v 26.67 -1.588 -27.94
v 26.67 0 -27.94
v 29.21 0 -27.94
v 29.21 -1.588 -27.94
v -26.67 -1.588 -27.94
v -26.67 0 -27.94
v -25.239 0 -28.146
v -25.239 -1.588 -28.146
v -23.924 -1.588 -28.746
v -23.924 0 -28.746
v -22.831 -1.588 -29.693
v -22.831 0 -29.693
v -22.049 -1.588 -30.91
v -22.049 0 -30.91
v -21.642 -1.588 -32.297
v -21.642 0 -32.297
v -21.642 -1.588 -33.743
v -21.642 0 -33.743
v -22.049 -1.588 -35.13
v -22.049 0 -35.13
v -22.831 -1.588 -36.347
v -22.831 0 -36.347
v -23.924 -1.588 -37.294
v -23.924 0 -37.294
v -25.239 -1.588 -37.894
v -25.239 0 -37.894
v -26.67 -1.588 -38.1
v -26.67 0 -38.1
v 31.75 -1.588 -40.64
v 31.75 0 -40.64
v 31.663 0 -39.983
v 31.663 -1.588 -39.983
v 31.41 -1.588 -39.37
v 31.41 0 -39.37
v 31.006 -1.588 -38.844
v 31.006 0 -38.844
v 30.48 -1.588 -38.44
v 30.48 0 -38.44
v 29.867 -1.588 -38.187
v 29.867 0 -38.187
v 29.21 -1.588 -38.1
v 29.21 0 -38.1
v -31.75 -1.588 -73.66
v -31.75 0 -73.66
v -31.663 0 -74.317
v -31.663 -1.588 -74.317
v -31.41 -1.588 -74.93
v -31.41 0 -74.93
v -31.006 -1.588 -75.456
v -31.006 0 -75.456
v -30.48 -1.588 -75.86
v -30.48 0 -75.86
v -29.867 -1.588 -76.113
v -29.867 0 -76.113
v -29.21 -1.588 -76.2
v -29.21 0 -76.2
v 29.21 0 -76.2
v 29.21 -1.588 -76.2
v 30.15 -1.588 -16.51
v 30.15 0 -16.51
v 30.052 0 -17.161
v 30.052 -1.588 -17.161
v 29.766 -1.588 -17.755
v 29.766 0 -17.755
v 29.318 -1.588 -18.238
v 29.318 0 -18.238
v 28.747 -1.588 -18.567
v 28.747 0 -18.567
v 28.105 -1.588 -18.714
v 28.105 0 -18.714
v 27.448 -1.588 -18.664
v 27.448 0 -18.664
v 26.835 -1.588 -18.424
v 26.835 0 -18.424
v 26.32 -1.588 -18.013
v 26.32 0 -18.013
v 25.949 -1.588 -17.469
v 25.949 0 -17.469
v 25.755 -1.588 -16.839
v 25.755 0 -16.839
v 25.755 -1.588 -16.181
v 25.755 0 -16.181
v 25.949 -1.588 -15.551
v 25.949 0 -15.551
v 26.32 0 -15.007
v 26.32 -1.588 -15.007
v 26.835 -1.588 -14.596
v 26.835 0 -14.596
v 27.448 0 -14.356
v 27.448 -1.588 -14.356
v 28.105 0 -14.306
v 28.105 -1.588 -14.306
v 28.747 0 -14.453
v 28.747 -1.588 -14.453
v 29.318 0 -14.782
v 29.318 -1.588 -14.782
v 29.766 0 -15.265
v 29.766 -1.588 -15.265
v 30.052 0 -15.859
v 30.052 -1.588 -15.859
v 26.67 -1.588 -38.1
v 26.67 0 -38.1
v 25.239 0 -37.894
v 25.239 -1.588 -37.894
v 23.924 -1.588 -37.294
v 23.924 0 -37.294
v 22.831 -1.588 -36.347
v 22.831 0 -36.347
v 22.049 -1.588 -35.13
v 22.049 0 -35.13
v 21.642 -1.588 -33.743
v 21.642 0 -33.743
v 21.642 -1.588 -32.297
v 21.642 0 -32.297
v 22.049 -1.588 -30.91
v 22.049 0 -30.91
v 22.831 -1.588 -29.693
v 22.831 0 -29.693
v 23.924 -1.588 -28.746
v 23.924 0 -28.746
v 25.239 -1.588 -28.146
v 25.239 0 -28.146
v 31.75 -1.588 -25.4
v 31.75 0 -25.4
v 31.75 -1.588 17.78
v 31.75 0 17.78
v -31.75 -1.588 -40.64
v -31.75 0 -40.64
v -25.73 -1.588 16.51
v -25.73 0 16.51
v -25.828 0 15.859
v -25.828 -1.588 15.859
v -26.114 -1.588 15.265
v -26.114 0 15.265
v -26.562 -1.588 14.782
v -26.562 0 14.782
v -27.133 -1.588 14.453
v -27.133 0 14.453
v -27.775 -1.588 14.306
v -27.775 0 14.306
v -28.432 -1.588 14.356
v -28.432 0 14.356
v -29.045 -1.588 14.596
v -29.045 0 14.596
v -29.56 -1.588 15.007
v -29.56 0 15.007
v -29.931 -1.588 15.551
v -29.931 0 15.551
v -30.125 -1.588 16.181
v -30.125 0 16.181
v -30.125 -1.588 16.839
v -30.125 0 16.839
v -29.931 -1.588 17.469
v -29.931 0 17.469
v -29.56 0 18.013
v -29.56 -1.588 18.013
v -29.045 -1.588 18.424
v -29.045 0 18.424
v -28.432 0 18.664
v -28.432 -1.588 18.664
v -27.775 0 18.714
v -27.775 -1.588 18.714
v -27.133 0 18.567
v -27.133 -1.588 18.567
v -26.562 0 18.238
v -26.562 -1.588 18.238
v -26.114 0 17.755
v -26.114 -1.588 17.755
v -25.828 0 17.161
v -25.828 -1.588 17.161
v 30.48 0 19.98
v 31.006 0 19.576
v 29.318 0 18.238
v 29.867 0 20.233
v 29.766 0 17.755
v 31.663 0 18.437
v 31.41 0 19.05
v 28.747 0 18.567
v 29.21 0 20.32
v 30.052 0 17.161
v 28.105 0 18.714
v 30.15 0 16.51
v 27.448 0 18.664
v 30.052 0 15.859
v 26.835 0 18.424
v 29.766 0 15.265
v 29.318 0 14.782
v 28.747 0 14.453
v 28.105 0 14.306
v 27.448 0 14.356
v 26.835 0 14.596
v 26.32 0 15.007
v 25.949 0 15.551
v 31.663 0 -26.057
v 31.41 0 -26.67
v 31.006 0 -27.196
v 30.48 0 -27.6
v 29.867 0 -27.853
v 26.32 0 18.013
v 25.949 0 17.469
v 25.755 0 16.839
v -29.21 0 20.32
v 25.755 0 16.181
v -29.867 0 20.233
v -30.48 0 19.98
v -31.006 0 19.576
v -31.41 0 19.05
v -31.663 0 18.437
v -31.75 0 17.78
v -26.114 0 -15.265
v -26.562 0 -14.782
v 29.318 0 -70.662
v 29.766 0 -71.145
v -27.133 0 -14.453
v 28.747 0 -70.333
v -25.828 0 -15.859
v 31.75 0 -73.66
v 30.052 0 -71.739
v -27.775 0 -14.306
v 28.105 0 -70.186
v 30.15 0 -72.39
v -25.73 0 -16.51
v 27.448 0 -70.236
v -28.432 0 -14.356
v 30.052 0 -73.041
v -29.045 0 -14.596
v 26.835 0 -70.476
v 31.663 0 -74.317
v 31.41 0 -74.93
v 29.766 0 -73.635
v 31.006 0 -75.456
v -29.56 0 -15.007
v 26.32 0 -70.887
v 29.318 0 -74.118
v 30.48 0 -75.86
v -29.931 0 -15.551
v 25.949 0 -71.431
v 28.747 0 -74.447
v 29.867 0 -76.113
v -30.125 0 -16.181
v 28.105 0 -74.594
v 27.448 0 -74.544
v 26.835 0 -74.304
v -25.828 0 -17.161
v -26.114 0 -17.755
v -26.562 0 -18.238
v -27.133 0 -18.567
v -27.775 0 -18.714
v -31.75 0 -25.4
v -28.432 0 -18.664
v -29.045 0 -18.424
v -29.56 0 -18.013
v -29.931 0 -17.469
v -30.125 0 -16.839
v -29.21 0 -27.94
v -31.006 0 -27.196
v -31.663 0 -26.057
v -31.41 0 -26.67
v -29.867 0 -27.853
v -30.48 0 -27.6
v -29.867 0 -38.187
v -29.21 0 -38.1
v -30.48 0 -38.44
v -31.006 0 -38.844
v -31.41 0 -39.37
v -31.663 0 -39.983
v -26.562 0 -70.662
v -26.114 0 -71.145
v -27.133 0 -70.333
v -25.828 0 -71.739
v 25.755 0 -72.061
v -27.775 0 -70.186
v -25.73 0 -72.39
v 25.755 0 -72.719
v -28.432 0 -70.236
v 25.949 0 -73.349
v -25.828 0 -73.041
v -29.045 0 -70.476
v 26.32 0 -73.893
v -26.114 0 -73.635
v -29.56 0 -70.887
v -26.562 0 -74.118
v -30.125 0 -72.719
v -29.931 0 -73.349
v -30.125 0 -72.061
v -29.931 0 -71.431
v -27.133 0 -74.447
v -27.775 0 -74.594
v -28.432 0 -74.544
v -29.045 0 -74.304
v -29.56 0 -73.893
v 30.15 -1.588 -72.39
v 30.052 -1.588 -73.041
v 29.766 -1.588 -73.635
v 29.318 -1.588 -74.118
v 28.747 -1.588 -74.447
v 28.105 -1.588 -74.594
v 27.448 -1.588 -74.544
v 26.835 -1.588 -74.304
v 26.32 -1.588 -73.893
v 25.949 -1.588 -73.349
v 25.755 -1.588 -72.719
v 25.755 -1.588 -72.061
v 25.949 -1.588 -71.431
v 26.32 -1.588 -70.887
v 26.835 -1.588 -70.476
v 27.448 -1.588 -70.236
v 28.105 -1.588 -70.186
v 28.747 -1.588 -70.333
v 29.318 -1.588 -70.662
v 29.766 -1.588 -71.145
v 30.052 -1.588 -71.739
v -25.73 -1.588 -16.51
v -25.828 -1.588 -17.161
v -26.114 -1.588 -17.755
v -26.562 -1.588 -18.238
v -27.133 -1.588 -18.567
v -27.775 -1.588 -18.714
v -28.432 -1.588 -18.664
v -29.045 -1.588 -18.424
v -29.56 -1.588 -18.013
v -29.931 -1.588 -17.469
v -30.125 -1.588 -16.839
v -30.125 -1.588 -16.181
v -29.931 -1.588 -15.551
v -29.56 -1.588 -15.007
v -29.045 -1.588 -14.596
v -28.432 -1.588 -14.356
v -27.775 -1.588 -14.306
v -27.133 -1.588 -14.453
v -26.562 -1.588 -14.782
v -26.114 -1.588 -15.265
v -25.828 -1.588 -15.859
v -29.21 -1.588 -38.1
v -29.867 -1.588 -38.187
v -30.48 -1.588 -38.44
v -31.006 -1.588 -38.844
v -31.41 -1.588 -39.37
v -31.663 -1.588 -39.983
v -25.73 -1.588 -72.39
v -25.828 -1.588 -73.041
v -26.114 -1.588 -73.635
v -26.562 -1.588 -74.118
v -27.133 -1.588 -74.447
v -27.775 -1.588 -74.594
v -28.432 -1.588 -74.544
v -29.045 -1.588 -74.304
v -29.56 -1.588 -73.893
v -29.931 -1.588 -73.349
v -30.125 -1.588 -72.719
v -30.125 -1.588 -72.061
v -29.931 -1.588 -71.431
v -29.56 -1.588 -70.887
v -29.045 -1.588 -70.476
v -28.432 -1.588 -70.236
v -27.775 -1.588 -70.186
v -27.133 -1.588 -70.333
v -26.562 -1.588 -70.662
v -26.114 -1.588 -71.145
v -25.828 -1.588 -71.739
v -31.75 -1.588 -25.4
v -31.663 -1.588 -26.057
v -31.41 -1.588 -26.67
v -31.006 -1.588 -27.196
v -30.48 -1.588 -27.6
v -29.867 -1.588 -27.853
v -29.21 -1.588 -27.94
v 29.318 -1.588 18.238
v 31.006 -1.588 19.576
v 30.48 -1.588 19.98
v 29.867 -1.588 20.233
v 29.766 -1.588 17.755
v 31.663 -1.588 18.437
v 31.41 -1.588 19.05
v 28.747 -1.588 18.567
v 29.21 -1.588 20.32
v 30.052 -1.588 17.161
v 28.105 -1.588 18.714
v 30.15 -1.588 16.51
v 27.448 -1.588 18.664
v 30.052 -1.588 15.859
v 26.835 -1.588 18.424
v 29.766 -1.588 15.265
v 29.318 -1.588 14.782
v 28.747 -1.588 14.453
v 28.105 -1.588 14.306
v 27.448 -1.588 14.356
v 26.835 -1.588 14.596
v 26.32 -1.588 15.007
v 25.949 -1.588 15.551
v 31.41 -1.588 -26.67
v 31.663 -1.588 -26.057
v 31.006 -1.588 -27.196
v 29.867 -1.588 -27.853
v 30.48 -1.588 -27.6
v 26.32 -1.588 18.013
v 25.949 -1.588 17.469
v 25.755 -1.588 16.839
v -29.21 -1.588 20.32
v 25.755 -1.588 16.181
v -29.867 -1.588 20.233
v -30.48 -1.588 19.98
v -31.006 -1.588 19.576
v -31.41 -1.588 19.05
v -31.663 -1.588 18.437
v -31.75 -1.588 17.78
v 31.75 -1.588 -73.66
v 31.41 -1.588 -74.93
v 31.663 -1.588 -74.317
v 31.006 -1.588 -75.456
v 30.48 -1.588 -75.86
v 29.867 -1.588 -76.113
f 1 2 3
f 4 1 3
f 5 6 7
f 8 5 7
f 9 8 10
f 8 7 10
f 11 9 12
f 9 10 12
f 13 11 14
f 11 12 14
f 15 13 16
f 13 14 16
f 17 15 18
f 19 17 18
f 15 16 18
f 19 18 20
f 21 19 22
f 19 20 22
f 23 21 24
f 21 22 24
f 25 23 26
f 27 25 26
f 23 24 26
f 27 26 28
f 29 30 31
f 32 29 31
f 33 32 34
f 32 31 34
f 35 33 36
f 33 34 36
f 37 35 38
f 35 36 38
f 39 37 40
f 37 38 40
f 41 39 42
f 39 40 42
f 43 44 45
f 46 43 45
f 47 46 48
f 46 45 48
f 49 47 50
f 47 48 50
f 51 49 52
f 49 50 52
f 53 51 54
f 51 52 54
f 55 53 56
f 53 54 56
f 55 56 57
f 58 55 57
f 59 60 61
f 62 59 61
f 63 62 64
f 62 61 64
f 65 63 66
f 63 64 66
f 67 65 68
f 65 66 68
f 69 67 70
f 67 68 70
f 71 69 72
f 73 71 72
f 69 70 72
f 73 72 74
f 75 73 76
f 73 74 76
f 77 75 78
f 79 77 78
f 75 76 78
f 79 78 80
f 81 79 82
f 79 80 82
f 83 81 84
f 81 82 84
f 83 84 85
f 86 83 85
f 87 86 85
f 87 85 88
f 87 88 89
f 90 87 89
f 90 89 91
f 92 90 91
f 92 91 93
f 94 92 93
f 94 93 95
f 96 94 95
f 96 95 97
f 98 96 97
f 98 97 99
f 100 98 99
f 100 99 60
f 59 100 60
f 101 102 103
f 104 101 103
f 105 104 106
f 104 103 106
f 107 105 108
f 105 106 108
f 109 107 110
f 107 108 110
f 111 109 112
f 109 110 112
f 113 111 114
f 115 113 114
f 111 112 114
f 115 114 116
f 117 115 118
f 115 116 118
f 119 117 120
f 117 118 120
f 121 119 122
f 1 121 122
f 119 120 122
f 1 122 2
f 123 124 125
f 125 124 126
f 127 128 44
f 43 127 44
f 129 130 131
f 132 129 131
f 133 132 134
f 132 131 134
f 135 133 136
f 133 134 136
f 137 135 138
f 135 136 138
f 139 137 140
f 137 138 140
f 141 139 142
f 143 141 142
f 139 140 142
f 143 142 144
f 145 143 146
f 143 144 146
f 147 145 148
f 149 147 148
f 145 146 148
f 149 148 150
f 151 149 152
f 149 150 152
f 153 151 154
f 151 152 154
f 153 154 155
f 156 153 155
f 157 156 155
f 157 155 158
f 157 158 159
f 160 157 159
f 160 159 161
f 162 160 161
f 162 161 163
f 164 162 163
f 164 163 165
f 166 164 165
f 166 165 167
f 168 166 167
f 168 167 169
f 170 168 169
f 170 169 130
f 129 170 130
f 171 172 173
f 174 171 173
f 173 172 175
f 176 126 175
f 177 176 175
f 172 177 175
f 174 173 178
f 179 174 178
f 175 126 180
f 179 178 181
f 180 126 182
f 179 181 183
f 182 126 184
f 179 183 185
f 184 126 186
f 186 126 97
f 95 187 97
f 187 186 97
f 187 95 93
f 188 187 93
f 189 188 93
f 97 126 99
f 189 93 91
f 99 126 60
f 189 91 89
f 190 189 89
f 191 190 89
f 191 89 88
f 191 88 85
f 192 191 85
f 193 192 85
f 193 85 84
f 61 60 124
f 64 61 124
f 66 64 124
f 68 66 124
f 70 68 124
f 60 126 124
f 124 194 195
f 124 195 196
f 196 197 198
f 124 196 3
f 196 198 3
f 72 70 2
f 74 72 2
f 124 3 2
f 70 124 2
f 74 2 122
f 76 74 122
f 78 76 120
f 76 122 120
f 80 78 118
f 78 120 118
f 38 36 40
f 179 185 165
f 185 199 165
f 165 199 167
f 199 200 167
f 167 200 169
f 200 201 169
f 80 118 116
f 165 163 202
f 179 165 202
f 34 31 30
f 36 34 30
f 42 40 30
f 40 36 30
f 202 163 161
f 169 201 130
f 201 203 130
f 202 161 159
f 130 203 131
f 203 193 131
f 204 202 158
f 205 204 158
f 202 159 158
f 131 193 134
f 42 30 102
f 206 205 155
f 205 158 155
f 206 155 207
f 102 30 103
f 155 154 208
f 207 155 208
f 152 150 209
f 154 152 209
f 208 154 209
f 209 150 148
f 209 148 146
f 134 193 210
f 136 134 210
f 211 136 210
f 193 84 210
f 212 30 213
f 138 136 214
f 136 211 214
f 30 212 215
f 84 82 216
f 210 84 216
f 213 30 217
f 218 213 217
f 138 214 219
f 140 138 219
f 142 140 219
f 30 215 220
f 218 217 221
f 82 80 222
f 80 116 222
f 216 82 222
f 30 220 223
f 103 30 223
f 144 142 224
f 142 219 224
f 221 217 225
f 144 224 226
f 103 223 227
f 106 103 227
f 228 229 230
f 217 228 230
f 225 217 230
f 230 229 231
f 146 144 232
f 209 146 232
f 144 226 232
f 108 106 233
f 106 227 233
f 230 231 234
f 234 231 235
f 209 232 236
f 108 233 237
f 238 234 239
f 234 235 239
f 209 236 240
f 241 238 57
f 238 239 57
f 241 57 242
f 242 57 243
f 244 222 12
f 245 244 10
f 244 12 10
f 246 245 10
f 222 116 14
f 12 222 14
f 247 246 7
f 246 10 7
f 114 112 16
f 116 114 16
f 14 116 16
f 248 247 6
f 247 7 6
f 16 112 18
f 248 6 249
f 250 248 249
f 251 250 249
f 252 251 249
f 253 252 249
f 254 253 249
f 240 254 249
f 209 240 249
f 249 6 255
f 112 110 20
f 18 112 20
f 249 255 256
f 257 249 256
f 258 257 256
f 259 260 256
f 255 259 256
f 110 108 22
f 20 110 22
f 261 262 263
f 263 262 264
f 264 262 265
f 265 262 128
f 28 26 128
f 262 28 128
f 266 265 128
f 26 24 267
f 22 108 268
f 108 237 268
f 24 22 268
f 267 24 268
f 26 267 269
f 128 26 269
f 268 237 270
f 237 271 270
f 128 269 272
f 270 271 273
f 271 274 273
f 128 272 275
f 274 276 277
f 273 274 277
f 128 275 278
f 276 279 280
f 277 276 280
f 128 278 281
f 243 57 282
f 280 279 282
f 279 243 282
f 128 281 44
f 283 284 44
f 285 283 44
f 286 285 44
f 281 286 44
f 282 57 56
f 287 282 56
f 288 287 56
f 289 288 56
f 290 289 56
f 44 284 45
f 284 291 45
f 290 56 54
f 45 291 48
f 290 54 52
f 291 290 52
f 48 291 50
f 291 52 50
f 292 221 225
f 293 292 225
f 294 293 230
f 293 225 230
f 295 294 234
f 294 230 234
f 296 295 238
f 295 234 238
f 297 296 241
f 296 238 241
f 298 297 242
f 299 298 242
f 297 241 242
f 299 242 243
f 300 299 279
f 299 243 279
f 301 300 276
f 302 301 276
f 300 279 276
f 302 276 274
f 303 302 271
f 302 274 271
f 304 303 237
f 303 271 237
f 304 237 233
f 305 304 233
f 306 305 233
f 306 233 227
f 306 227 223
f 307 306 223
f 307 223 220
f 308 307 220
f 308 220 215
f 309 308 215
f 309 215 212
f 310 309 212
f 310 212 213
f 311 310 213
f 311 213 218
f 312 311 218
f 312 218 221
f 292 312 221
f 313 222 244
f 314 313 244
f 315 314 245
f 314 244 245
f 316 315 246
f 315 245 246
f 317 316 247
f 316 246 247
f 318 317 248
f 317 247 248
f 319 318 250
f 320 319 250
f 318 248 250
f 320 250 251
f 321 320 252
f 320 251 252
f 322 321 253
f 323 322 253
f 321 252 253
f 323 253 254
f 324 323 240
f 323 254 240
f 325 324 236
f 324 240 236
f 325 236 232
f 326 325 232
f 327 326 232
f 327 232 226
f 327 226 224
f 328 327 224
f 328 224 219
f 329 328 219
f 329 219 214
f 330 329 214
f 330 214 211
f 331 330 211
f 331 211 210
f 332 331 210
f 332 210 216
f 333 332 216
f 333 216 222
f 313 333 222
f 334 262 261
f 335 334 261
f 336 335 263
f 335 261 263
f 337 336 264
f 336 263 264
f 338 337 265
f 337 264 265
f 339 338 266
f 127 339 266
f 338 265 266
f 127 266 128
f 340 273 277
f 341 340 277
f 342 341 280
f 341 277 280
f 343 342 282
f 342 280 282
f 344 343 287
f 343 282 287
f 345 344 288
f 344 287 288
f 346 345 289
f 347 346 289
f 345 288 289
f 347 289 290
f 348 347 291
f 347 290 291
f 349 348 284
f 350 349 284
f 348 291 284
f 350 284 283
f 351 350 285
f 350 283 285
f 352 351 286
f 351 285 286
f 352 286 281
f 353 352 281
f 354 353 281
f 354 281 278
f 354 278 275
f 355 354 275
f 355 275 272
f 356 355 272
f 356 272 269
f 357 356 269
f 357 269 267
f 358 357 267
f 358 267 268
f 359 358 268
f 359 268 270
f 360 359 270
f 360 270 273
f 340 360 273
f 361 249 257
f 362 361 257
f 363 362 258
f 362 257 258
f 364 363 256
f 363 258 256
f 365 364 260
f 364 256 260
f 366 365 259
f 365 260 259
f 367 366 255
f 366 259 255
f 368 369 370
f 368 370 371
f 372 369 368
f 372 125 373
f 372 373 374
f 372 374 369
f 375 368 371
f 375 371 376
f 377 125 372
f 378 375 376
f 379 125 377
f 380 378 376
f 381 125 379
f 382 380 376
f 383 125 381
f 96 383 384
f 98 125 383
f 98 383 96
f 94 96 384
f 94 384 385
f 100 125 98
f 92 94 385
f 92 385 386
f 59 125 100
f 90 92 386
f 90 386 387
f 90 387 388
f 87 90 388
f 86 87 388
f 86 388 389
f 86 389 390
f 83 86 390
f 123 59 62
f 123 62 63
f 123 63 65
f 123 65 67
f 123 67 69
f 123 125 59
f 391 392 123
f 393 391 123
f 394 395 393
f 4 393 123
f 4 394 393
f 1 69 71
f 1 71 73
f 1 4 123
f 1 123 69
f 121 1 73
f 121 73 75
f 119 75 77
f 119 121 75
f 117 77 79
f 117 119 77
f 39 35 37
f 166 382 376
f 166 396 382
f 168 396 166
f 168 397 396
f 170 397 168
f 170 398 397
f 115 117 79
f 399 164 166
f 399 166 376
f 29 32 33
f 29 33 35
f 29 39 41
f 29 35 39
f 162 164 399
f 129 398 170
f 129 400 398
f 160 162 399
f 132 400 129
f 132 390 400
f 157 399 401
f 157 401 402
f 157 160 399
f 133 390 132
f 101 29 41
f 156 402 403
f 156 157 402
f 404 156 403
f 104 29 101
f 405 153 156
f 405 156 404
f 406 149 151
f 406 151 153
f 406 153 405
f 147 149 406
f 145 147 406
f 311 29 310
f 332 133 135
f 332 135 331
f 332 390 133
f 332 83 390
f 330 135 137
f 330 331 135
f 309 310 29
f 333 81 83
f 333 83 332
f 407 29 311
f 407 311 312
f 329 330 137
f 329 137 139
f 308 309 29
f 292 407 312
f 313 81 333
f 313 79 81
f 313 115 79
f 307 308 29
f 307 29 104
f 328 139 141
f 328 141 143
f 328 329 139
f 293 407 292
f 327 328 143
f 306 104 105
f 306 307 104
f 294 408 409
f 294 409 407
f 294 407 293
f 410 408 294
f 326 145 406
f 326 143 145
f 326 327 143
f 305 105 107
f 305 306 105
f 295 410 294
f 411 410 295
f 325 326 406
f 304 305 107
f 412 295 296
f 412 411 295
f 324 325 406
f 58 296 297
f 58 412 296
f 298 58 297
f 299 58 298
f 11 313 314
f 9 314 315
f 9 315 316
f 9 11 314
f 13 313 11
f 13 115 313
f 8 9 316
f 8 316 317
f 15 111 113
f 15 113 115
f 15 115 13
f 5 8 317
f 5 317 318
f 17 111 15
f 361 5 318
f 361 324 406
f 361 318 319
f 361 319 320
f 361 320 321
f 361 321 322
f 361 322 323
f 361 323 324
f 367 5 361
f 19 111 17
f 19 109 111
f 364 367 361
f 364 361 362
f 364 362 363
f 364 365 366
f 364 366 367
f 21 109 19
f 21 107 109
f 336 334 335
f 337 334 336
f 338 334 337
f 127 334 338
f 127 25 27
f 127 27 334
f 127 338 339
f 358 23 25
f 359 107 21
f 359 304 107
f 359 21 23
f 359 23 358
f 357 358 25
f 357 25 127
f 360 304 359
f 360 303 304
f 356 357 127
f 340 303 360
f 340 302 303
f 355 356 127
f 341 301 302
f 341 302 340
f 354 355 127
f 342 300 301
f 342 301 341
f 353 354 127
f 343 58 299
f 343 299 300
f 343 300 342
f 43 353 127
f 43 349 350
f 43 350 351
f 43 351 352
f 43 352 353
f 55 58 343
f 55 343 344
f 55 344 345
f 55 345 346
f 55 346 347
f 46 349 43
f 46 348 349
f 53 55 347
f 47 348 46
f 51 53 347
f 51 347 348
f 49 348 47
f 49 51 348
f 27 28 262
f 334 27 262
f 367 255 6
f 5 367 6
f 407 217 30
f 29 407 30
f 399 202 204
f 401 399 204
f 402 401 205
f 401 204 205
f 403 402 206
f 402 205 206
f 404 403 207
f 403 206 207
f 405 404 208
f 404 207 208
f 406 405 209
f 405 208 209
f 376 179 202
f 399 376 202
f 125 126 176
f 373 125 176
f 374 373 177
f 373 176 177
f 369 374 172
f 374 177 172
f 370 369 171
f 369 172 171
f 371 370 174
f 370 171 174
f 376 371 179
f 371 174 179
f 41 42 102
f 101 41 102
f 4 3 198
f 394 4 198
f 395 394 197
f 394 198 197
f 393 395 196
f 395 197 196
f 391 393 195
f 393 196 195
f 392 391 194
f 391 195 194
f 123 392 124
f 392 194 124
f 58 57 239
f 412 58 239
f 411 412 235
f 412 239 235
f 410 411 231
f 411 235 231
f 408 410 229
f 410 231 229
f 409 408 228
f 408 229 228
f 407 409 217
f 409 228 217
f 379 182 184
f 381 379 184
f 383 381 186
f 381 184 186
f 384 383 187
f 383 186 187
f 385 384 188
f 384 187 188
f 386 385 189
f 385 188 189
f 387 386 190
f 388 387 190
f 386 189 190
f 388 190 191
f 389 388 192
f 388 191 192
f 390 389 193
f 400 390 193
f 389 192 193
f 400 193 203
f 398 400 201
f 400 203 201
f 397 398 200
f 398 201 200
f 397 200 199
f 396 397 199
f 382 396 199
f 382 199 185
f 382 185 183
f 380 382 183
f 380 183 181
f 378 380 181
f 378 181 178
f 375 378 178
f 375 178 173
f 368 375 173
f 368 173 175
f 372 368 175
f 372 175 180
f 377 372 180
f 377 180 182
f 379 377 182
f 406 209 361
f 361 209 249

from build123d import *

# Parameters (mm, degrees)
BOSS_EXTRUDE1_DEPTH = 1.5875
SKETCH5_R           = 2.2098
CUT_EXTRUDE1_DEPTH  = 2.5875


with BuildPart() as part:
    # Sketch4 → Boss-Extrude1 (new body)
    with BuildSketch(Plane(origin=(0, 0, 0), x_dir=(1, 0, 0), z_dir=(0, 1, 0))):
        with BuildLine():
            Line((-29.21, 76.2), (29.21, 76.2))
            ThreePointArc((29.21, 76.2), (31.006051224, 75.456051224), (31.75, 73.66))
            Line((31.75, 73.66), (31.75, 40.64))
            ThreePointArc((31.75, 40.64), (31.006051224, 38.843948776), (29.21, 38.1))
            Line((29.21, 38.1), (26.67, 38.1))
            ThreePointArc((26.67, 38.1), (21.59, 33.02), (26.67, 27.94))
            Line((26.67, 27.94), (29.21, 27.94))
            ThreePointArc((29.21, 27.94), (31.006051224, 27.196051224), (31.75, 25.4))
            Line((31.75, 25.4), (31.75, -17.78))
            ThreePointArc((31.75, -17.78), (31.006051224, -19.576051224), (29.21, -20.32))
            Line((29.21, -20.32), (-29.21, -20.32))
            ThreePointArc((-29.21, -20.32), (-31.006051224, -19.576051224), (-31.75, -17.78))
            Line((-31.75, -17.78), (-31.75, 25.4))
            ThreePointArc((-31.75, 25.4), (-31.006051224, 27.196051224), (-29.21, 27.94))
            Line((-29.21, 27.94), (-26.67, 27.94))
            ThreePointArc((-26.67, 27.94), (-21.59, 33.02), (-26.67, 38.1))
            Line((-26.67, 38.1), (-29.21, 38.1))
            ThreePointArc((-29.21, 38.1), (-31.006051224, 38.843948776), (-31.75, 40.64))
            Line((-31.75, 40.64), (-31.75, 73.66))
            ThreePointArc((-31.75, 73.66), (-31.006051224, 75.456051224), (-29.21, 76.2))
        make_face()
    extrude(amount=-BOSS_EXTRUDE1_DEPTH)

    # Sketch5 → Cut-Extrude1 (cut, through all)
    with BuildSketch(Plane(origin=(0, 0, 0), x_dir=(1, 0, 0), z_dir=(0, 1, 0))):
        with Locations((-27.94, 72.39)):
            Circle(SKETCH5_R)
        with Locations((27.94, 72.39)):
            Circle(SKETCH5_R)
        with Locations((-27.94, -16.51)):
            Circle(SKETCH5_R)
        with Locations((27.94, -16.51)):
            Circle(SKETCH5_R)
        with Locations((-27.94, 16.51)):
            Circle(SKETCH5_R)
        with Locations((27.94, 16.51)):
            Circle(SKETCH5_R)
    extrude(amount=-CUT_EXTRUDE1_DEPTH, mode=Mode.SUBTRACT)


solid = part.part
